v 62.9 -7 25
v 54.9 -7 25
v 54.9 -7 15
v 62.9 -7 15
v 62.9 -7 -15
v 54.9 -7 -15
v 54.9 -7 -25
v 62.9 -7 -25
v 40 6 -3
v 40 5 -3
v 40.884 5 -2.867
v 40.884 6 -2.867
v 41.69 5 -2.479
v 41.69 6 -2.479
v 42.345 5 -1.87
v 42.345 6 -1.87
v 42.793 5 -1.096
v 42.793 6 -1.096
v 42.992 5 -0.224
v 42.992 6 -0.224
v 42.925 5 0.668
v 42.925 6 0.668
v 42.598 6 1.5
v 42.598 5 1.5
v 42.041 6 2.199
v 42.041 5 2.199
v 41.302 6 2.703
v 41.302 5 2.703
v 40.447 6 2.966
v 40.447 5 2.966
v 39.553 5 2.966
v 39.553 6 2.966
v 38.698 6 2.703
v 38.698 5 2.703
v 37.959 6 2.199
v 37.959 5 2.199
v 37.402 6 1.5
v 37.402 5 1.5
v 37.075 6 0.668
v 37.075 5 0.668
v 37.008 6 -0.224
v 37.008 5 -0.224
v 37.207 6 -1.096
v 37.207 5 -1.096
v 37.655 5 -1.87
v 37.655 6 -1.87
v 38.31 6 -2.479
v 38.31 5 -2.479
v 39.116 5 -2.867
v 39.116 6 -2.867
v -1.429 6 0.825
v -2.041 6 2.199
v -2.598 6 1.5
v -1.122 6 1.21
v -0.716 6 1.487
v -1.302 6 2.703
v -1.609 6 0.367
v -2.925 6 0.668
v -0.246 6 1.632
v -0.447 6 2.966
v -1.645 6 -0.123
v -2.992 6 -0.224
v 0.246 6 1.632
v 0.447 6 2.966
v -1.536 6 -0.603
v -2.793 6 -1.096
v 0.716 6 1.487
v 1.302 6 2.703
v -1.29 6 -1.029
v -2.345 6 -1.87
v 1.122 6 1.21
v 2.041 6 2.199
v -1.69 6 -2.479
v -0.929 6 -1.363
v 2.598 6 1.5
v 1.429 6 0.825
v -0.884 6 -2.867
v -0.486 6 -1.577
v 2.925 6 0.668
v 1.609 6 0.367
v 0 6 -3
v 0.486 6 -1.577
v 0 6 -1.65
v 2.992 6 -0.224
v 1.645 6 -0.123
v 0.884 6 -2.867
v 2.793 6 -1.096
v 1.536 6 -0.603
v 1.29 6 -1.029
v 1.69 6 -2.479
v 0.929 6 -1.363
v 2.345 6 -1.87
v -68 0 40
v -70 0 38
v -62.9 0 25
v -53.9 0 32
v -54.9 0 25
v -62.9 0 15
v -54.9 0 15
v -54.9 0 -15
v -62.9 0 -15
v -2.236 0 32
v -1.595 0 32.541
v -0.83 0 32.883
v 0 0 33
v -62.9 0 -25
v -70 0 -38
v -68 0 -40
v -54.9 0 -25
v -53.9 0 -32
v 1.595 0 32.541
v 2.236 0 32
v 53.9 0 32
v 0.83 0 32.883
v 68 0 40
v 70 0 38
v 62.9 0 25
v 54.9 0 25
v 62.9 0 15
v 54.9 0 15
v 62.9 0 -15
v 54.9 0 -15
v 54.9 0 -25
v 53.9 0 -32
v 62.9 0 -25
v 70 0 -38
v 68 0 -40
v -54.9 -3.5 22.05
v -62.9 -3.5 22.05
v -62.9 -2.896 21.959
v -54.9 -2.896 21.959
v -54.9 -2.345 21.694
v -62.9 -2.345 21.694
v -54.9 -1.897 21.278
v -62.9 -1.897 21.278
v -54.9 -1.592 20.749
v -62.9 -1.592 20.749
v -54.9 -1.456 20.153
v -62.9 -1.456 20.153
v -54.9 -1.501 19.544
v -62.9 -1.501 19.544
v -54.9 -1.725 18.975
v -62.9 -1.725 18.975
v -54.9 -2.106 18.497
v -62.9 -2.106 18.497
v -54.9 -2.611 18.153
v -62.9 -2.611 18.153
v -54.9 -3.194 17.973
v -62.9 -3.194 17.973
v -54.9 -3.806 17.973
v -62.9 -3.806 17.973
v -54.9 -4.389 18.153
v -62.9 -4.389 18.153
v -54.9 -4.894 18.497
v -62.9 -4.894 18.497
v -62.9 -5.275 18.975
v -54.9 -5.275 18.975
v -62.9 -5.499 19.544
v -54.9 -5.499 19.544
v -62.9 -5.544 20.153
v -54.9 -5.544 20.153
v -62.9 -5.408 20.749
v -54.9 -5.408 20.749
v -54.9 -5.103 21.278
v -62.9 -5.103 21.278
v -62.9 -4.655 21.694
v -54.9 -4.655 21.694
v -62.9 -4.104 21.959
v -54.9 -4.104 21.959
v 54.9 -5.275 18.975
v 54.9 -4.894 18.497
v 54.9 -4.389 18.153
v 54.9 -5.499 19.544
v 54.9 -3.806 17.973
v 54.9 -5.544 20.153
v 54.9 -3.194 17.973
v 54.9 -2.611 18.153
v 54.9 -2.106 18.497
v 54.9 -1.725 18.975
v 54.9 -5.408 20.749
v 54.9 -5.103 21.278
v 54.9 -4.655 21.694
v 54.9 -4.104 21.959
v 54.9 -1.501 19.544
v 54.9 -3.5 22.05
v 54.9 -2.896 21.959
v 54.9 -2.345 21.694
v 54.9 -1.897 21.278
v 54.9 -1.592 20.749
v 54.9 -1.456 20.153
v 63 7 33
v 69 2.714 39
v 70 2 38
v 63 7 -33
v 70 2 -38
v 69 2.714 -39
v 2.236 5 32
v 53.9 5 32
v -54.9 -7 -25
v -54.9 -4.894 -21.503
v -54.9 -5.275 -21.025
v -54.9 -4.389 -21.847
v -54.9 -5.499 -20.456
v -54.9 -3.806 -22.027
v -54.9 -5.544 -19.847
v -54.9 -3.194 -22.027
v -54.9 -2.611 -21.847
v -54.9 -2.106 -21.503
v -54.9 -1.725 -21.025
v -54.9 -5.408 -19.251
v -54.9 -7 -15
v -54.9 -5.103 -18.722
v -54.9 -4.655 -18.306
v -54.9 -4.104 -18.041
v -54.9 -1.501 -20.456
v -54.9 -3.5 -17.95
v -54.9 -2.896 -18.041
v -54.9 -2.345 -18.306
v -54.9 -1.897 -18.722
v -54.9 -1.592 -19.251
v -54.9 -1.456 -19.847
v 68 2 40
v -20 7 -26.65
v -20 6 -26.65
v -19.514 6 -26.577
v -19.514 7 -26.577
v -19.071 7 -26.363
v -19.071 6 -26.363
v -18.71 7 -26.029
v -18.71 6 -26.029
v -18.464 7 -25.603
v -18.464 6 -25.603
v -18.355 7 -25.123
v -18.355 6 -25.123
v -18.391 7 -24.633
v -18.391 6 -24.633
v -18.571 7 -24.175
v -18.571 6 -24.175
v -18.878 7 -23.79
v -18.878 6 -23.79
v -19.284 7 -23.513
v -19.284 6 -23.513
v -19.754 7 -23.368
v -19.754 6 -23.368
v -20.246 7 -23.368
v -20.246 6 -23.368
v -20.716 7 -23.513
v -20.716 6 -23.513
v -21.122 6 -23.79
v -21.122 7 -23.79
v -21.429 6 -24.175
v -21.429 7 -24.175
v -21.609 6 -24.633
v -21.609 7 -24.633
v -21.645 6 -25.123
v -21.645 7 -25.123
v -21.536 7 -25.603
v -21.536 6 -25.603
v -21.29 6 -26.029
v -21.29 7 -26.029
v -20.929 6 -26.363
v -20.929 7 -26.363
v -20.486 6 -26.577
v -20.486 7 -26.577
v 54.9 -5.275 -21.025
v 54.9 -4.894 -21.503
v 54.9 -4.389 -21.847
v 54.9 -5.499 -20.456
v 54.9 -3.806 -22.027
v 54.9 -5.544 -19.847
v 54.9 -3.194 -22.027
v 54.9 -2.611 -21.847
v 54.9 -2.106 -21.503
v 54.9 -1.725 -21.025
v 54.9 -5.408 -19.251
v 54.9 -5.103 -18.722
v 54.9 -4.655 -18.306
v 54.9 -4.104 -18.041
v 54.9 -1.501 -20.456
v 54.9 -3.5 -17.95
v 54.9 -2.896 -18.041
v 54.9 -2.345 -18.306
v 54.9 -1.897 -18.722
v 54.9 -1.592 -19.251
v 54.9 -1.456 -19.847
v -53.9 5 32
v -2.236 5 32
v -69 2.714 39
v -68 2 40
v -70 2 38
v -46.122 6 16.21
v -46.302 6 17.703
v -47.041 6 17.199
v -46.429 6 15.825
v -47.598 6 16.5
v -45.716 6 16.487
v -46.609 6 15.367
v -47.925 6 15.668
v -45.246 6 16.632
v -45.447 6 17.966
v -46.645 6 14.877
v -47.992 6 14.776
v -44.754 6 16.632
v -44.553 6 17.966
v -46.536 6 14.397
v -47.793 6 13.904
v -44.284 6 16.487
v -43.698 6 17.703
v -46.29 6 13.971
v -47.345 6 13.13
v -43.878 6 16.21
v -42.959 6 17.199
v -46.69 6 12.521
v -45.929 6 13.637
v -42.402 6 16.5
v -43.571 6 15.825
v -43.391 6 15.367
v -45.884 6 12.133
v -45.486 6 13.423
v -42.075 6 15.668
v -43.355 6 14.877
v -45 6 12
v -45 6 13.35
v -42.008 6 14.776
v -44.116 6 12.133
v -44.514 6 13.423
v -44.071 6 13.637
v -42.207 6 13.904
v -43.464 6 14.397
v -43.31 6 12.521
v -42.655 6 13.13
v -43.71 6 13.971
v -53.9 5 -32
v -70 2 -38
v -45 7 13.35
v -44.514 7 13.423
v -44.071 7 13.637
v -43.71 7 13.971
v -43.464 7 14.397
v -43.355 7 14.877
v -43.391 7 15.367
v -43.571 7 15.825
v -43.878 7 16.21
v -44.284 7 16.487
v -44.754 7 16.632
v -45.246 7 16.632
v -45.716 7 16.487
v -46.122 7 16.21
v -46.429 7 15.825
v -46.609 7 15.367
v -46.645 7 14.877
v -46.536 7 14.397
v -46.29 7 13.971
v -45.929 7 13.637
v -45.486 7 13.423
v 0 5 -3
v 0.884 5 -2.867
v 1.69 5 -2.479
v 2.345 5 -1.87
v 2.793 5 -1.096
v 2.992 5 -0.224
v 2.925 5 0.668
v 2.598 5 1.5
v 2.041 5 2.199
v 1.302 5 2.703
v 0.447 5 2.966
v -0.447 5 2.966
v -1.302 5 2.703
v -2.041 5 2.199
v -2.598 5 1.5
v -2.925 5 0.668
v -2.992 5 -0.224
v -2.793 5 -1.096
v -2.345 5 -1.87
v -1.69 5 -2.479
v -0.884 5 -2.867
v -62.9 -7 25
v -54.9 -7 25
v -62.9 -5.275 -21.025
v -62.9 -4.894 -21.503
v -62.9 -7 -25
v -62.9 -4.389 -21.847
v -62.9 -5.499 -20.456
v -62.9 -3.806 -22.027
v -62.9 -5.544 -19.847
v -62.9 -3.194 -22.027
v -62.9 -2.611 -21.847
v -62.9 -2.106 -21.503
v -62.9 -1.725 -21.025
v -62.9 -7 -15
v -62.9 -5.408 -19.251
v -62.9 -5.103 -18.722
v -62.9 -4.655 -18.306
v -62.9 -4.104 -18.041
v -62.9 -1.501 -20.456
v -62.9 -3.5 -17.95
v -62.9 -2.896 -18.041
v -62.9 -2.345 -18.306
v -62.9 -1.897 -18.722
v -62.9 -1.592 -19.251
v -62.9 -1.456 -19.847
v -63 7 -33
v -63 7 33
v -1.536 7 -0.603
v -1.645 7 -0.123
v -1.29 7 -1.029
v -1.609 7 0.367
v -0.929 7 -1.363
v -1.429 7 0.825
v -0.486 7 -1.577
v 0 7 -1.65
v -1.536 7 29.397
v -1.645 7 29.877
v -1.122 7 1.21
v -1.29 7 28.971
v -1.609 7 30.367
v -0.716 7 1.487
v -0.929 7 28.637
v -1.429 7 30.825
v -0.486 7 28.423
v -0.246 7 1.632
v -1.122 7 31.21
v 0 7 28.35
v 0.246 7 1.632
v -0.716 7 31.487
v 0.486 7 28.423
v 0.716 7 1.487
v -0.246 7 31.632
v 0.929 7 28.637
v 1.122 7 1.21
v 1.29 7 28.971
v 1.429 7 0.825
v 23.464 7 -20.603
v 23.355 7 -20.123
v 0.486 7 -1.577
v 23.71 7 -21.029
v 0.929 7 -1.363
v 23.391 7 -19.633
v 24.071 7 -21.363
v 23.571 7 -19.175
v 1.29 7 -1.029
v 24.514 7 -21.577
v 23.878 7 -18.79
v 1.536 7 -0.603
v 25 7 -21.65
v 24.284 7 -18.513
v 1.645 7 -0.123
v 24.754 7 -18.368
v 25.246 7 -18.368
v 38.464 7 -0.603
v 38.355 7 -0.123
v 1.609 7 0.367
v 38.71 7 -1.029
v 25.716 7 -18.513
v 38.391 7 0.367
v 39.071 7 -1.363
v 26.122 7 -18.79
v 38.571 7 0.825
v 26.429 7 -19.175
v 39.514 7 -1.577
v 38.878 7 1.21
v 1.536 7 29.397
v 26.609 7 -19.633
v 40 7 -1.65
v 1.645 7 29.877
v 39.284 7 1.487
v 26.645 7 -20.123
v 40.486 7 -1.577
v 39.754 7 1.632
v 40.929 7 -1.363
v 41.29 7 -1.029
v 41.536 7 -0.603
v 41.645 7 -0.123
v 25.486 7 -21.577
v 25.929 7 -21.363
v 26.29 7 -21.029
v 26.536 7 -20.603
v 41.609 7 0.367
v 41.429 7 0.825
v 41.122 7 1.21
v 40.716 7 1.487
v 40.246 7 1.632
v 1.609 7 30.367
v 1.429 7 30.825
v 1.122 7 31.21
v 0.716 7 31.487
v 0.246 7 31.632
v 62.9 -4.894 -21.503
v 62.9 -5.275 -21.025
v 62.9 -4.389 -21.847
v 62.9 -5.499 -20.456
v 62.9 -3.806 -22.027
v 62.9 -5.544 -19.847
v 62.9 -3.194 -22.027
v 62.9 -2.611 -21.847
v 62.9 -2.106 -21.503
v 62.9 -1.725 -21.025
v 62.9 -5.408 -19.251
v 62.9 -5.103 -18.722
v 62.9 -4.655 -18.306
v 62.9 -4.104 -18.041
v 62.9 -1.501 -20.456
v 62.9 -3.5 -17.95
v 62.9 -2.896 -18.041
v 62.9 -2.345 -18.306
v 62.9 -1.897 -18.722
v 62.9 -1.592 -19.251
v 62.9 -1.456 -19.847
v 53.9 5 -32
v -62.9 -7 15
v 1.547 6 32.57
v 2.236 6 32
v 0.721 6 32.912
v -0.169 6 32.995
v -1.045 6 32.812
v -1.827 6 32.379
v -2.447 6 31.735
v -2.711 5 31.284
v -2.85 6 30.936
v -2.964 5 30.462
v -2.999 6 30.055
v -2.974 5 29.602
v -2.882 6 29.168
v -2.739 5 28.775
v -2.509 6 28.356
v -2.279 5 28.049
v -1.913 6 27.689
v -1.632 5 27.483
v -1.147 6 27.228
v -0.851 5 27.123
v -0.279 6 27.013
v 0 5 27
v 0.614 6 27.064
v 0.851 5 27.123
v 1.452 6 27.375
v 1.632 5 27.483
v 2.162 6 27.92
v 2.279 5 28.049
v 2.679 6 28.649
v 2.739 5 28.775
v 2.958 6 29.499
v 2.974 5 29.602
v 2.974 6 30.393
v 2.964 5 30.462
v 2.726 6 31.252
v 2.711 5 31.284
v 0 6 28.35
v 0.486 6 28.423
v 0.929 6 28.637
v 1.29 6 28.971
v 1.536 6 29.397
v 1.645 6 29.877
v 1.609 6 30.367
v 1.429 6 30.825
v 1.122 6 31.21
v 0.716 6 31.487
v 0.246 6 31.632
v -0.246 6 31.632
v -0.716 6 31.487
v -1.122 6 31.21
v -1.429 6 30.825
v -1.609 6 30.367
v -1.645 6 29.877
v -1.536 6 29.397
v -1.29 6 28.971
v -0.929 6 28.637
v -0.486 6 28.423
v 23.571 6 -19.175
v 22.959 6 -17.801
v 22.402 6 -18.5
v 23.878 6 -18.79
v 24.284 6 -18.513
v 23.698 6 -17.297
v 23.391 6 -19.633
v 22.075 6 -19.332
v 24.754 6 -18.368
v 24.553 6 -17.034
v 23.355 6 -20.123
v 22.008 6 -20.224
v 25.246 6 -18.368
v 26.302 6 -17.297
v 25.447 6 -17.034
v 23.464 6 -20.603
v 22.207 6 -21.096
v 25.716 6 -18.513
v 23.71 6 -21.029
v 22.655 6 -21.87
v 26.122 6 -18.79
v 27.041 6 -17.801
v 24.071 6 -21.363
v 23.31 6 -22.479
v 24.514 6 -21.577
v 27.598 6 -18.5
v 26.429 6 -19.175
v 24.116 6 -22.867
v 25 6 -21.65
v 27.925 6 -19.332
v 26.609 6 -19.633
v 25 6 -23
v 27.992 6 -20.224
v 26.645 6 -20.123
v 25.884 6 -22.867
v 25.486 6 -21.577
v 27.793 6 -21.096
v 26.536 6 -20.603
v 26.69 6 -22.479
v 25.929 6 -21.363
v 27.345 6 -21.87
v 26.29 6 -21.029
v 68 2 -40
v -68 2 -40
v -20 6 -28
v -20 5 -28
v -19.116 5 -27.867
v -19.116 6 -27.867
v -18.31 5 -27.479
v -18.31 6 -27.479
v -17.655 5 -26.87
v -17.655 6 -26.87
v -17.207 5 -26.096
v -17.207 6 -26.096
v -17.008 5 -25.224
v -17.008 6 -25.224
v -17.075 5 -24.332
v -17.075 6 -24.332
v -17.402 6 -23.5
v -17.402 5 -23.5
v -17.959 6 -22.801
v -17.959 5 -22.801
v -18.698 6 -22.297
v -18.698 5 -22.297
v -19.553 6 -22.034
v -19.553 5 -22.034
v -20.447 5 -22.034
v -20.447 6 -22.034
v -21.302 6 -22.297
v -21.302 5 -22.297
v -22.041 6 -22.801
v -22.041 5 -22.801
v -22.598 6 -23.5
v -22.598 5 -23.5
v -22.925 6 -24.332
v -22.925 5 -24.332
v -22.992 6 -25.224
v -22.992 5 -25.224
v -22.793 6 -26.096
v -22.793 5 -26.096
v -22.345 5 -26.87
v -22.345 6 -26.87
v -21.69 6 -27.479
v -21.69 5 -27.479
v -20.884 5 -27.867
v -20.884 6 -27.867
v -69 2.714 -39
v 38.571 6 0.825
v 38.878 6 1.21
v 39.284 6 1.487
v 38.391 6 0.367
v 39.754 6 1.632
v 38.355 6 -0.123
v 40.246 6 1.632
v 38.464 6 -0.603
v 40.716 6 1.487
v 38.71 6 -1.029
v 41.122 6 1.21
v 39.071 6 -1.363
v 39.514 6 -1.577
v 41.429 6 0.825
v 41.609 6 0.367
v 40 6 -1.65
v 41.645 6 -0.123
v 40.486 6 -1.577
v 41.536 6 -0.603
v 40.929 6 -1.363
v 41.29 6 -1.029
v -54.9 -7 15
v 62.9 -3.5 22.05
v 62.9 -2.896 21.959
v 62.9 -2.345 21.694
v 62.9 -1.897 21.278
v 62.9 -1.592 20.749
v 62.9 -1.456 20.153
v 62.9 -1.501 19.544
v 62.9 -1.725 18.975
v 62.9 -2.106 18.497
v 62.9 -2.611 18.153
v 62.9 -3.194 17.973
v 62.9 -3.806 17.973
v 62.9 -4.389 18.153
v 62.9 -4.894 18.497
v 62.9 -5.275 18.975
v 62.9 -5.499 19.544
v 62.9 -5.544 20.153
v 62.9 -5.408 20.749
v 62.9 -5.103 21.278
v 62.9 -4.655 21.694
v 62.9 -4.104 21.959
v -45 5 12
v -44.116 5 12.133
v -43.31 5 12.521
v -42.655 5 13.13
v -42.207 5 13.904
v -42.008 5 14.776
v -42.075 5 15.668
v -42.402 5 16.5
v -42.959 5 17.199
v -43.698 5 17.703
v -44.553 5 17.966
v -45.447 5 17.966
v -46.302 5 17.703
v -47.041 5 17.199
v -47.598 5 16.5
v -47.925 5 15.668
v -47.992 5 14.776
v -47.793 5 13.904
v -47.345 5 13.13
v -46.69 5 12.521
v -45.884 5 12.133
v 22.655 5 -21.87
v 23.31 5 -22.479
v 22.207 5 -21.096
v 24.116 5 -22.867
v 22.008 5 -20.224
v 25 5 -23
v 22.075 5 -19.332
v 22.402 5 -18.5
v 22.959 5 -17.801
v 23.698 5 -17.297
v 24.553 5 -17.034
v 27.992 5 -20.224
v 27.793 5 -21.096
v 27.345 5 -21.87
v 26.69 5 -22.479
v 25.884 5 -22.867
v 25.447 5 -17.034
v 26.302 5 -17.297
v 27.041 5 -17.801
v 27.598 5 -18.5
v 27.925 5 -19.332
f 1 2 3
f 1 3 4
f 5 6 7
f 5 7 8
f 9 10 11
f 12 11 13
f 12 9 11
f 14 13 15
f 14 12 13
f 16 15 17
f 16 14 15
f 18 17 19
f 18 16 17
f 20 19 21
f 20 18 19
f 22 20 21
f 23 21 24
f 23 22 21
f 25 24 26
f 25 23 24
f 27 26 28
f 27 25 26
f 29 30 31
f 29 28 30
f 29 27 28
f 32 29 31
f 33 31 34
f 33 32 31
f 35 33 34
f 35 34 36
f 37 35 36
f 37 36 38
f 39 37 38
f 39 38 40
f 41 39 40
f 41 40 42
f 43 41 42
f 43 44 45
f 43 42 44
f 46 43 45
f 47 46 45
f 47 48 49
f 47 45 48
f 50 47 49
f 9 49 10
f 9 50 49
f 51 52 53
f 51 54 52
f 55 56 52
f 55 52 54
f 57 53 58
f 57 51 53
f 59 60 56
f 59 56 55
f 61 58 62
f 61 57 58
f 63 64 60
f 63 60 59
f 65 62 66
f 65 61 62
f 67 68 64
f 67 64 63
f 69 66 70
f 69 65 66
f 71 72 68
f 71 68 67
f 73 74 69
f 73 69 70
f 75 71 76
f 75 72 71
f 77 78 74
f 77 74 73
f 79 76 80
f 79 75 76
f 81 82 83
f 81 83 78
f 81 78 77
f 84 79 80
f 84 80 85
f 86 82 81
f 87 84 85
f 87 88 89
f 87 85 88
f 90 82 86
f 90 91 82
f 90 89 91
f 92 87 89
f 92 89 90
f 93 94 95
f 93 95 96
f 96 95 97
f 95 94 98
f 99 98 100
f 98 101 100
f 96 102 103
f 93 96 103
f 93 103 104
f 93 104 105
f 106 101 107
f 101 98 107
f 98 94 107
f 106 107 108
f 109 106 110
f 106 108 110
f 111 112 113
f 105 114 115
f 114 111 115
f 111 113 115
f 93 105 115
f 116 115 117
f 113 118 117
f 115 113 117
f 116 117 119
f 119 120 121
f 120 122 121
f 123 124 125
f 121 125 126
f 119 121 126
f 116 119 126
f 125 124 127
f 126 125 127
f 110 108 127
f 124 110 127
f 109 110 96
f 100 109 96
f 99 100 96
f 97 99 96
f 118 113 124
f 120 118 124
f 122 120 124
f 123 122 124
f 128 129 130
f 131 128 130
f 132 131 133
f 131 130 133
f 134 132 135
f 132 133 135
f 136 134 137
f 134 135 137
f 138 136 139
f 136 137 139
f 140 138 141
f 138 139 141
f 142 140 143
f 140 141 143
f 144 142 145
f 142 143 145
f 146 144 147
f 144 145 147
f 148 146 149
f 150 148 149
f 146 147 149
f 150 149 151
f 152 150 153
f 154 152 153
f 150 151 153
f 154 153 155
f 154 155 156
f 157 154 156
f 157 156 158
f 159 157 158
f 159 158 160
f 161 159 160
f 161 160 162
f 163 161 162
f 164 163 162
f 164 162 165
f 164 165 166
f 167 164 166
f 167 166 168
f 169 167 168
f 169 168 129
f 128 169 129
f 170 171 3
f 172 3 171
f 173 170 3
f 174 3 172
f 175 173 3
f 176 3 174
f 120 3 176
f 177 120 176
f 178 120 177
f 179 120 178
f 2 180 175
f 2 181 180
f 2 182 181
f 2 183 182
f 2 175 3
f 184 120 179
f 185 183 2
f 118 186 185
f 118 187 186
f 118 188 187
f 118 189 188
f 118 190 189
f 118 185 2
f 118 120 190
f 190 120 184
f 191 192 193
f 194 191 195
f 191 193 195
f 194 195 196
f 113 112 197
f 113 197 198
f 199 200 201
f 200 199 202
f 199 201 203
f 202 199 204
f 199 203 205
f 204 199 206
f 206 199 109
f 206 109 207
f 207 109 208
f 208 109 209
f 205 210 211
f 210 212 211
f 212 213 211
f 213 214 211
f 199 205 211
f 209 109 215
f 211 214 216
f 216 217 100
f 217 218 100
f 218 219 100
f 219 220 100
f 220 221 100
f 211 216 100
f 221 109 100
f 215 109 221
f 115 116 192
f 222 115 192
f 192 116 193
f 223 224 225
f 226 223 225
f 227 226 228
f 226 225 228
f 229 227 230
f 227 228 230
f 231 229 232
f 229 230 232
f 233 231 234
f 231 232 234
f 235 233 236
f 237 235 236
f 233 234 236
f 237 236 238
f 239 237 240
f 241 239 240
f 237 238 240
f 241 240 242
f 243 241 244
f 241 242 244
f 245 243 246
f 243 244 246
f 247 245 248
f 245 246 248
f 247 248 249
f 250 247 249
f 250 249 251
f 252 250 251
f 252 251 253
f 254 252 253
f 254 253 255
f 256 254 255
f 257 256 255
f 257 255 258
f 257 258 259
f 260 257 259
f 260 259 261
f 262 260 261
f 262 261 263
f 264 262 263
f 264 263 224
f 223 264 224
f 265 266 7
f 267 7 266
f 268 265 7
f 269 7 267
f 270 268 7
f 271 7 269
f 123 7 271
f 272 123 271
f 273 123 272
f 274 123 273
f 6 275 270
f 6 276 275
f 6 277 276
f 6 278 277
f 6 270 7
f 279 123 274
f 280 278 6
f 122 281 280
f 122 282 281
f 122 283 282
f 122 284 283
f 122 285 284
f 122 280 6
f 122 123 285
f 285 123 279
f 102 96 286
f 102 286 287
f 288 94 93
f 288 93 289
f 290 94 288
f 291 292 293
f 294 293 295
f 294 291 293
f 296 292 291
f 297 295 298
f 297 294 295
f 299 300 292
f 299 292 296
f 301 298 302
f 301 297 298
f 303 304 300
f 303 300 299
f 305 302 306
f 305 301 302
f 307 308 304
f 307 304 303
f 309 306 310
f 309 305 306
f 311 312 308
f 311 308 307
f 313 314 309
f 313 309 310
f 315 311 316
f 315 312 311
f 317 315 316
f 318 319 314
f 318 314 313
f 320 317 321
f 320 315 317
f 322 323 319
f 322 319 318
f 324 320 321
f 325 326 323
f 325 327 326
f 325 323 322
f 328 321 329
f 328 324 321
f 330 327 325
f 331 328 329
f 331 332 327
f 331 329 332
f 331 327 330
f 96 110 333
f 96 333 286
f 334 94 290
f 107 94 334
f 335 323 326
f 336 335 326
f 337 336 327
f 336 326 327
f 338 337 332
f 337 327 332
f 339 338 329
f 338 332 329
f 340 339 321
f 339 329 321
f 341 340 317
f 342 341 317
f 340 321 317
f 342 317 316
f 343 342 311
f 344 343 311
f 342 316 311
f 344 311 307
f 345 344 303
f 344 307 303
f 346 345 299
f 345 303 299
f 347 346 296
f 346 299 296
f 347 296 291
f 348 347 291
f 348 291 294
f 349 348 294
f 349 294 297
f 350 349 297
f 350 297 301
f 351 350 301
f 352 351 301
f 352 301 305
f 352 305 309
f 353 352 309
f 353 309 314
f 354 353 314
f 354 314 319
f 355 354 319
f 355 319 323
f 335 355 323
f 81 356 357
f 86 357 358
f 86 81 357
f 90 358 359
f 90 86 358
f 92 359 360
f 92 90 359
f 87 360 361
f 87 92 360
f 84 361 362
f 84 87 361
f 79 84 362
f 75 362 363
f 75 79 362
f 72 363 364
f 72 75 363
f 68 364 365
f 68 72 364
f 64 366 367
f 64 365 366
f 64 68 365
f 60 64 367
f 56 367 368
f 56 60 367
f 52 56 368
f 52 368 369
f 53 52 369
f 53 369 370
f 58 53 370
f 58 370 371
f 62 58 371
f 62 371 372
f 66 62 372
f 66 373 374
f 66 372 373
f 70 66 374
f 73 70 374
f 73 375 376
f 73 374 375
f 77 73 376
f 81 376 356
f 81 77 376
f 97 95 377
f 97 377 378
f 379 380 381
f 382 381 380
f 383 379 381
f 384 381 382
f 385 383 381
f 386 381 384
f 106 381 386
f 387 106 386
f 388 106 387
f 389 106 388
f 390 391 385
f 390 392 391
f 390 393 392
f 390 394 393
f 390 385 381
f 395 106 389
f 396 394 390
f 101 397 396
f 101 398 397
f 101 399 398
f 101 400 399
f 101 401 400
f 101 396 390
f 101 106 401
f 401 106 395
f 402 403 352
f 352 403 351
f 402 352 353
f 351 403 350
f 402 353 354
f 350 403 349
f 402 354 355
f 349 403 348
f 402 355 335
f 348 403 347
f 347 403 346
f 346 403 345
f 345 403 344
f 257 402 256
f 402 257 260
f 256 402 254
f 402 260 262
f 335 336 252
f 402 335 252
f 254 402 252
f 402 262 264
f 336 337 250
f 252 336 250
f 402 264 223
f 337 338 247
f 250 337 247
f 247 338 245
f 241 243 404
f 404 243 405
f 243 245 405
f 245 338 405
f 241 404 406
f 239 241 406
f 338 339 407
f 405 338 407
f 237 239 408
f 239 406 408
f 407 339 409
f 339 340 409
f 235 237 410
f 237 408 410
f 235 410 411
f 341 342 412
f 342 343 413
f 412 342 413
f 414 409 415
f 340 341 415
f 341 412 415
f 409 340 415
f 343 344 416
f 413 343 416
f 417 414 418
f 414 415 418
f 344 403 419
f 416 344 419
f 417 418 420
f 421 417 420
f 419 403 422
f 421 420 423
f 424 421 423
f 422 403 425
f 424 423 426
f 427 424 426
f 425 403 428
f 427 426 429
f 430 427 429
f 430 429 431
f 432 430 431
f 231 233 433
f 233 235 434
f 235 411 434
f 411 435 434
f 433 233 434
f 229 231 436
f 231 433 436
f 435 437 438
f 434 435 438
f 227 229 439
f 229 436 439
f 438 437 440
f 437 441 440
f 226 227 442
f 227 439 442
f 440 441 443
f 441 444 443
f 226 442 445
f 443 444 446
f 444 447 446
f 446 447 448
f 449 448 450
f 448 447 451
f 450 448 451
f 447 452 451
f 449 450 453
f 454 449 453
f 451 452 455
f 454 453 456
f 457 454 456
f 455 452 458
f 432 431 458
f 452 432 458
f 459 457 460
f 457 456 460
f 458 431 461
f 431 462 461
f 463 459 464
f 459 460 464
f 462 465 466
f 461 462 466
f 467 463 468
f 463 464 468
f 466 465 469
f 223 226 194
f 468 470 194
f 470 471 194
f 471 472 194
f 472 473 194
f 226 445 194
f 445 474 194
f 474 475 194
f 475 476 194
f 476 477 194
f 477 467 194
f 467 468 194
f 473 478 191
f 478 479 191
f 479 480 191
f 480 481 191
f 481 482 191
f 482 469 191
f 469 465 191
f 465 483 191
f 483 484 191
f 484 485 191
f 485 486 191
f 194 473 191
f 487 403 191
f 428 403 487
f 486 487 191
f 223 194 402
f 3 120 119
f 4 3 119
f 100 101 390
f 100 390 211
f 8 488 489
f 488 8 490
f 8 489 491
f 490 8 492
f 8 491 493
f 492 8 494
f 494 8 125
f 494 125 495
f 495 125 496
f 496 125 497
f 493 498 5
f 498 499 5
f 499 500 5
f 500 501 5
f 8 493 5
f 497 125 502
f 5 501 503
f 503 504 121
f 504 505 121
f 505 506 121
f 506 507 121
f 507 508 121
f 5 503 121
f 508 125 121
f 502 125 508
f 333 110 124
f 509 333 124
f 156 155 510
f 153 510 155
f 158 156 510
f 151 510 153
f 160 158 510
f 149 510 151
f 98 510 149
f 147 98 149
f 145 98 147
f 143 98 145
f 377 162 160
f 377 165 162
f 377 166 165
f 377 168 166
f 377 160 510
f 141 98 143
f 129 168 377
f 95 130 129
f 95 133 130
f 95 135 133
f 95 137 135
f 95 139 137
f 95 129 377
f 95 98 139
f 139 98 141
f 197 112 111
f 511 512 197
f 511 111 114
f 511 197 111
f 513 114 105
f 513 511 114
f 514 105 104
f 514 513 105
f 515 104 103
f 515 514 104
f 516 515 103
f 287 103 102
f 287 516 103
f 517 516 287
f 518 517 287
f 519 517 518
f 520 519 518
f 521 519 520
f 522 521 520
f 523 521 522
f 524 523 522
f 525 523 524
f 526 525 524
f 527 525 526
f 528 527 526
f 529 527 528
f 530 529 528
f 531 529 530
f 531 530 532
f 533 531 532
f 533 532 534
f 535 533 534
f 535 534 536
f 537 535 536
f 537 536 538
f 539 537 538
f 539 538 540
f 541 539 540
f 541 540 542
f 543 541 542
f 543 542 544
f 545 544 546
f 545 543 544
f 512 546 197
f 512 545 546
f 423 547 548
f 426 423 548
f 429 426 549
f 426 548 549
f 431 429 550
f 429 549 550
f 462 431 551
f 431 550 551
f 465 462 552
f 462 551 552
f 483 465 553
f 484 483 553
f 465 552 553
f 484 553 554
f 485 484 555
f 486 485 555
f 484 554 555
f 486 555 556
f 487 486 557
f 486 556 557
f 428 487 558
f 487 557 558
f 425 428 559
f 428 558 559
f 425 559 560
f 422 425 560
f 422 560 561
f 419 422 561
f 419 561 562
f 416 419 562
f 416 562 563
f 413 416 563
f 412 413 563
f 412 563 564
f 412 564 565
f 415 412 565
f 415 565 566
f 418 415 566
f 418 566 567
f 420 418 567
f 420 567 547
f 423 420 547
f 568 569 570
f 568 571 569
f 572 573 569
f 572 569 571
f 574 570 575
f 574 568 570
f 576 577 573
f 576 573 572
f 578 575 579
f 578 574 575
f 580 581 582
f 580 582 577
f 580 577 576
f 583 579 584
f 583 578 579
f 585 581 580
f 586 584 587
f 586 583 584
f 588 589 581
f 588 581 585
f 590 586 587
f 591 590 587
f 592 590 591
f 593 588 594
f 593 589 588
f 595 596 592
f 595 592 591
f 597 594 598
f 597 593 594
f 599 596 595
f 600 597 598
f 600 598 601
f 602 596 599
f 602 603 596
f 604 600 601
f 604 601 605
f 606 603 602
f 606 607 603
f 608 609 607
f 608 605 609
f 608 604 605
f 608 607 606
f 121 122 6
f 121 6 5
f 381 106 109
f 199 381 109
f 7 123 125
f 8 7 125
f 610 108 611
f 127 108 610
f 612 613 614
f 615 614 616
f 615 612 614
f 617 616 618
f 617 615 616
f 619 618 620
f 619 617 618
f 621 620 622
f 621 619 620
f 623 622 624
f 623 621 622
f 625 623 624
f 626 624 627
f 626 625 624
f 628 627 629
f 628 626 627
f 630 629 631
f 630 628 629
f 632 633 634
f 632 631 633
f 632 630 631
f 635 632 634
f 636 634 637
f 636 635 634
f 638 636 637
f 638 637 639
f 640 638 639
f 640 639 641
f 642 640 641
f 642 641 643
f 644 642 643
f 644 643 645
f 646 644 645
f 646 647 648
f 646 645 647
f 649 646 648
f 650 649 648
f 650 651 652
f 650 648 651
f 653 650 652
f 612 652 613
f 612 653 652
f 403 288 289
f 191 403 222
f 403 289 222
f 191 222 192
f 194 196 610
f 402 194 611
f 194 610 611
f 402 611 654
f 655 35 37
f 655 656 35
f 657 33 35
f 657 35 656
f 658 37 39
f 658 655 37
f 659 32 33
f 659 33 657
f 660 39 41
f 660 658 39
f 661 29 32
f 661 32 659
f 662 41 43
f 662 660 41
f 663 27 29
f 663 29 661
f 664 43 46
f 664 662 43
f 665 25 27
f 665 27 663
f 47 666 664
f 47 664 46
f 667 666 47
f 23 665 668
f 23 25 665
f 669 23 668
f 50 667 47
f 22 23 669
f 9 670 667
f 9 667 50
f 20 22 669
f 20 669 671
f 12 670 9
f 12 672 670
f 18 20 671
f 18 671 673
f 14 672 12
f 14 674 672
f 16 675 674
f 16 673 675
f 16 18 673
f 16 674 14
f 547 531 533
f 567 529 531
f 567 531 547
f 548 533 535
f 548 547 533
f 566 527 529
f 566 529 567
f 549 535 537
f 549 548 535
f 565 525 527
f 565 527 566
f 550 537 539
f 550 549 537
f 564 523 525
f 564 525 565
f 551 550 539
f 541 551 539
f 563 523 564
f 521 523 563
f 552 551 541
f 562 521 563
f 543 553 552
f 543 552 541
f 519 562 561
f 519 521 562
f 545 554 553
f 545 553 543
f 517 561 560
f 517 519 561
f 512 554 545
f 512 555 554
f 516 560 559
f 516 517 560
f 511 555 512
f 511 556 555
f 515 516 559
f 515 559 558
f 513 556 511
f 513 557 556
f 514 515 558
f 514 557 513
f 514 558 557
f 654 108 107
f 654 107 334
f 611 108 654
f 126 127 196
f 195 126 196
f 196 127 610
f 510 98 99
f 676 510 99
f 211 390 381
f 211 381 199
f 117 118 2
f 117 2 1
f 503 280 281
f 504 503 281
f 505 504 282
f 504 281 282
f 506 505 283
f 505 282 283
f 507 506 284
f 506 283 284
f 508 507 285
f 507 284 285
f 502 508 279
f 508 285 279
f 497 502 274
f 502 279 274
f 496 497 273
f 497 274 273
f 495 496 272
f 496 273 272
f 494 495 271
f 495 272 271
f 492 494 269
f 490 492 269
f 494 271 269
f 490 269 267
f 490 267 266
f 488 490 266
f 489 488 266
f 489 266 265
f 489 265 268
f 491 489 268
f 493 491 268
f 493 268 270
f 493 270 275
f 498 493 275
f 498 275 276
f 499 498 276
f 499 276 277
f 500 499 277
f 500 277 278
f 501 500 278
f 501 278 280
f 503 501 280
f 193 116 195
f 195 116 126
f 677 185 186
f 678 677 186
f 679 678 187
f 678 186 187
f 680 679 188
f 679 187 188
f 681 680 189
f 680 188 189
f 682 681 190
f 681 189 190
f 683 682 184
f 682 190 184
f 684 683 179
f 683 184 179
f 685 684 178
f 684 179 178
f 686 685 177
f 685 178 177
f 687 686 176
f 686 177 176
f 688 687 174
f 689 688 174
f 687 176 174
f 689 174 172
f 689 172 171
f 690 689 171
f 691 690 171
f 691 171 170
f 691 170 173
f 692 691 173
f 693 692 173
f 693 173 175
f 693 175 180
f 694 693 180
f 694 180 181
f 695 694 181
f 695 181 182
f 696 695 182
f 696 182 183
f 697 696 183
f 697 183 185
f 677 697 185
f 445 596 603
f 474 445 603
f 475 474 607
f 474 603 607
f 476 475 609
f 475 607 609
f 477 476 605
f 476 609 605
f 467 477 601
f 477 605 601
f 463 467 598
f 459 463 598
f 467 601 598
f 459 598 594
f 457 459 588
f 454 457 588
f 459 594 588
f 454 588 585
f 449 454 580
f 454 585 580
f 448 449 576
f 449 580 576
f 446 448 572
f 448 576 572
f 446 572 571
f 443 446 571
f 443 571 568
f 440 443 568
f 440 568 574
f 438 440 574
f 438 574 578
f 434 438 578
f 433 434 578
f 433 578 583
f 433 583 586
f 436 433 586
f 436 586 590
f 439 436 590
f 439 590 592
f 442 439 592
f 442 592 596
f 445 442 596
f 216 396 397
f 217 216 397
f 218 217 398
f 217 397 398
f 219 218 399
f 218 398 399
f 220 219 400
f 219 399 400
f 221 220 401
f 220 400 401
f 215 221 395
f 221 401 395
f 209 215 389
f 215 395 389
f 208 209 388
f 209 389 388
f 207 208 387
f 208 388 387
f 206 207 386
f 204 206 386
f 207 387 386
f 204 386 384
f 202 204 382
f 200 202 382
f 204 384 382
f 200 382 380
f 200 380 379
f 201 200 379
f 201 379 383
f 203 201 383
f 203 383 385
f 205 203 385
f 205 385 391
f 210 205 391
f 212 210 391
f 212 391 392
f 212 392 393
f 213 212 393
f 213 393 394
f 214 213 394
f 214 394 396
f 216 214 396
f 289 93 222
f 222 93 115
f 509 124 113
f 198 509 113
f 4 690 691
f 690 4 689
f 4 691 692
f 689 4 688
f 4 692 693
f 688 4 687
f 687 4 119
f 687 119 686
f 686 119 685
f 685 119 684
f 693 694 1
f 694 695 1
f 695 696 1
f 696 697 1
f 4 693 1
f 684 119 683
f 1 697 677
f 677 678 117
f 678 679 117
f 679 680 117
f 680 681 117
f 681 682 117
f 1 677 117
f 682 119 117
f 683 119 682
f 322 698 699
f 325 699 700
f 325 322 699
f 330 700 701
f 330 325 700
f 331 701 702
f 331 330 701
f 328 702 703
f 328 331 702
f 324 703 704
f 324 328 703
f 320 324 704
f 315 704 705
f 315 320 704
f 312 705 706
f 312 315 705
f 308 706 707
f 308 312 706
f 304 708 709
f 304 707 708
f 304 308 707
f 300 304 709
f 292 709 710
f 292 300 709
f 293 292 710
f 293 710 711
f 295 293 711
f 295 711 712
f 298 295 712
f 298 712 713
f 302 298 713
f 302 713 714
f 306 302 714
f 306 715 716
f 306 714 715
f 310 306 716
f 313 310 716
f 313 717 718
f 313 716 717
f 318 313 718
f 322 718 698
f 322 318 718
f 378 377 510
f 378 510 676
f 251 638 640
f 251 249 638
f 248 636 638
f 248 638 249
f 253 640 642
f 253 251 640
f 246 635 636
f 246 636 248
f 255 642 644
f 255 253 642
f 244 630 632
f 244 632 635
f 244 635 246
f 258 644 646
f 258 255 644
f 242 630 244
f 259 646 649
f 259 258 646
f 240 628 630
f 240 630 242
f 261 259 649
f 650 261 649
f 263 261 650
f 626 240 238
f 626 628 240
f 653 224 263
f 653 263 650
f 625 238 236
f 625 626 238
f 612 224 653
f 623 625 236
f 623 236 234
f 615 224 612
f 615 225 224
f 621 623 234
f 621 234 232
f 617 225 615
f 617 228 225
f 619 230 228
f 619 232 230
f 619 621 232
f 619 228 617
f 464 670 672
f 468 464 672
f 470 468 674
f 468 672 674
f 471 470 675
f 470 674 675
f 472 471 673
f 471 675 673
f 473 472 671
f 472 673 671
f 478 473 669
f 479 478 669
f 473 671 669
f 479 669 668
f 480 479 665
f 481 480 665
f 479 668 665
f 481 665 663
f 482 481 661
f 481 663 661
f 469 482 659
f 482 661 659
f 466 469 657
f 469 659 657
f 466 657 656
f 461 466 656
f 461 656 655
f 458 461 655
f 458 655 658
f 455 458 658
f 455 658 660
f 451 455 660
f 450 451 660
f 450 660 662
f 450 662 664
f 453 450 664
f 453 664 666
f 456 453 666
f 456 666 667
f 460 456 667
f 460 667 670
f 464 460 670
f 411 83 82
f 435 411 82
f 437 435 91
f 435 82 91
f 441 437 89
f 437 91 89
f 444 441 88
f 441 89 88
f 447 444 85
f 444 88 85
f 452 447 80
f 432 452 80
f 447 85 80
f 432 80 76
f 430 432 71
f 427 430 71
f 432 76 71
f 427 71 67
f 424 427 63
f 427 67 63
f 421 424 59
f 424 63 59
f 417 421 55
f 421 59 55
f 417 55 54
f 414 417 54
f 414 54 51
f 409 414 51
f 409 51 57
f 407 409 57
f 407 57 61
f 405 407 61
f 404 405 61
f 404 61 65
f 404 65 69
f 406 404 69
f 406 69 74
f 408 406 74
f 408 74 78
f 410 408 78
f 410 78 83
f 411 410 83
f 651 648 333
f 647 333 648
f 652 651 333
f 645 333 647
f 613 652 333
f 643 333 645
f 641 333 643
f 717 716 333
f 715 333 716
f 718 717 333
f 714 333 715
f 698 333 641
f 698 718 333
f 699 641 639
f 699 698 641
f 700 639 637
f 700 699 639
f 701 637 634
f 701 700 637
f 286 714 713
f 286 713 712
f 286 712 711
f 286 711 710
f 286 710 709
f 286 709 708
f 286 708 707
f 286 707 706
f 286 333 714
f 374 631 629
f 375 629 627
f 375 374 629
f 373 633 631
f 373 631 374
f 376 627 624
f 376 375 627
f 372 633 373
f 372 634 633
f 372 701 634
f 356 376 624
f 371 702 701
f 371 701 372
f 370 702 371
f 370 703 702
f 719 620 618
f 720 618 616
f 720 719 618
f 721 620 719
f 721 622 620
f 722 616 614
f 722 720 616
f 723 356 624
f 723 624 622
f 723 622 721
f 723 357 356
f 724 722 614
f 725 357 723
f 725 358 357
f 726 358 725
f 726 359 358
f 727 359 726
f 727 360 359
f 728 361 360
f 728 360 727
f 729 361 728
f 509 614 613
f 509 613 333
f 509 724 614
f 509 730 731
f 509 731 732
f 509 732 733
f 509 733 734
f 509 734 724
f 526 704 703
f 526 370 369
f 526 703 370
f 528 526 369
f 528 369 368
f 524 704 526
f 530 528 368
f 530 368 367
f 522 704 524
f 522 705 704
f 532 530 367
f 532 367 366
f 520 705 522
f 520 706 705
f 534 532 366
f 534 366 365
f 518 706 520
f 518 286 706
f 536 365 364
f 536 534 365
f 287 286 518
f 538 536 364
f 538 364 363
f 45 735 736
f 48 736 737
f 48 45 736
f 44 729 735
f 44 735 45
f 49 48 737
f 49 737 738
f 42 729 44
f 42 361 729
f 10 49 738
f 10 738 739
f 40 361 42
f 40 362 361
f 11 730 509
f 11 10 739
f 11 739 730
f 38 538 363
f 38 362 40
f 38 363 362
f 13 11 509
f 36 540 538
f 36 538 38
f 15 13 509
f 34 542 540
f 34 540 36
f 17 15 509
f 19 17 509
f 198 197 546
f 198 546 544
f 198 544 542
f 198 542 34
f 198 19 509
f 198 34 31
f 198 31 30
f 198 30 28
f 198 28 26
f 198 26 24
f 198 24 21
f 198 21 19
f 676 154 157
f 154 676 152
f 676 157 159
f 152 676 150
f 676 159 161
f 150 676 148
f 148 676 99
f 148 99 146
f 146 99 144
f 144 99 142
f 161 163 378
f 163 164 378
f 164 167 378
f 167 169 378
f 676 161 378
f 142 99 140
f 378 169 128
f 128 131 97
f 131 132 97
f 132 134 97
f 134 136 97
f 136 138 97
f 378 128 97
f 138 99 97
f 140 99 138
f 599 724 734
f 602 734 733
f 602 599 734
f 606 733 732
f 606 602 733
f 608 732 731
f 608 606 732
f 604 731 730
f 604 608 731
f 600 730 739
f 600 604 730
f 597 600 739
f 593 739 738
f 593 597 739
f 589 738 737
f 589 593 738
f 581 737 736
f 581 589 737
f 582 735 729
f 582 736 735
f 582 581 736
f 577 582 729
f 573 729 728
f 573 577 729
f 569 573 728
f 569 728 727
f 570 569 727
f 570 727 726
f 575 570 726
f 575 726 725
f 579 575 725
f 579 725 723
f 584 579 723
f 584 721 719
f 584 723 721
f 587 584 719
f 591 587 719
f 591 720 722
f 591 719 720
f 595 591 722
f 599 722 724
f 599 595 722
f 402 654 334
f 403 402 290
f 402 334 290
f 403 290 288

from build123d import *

# Parameters (mm, degrees)
SKETCH1_W               = 140
SKETCH1_H               = 80
BOSS_EXTRUDE1_DEPTH     = 2
CHAMFER2_SIZE           = 2
SKETCH4_W               = 8
SKETCH4_H               = 10
BOSS_EXTRUDE2_DEPTH     = 7
SKETCH5_R               = 2.05
CUT_EXTRUDE1_DEPTH      = 139.965499445
SKETCH6_W               = 107.8
SKETCH6_H               = 64
CUT_EXTRUDE2_DEPTH      = 5
SKETCH7_R               = 1.65
CUT_EXTRUDE3_DEPTH      = 82.510735624
CUT_EXTRUDE4_DEPTH      = 82.510735624
CUT_EXTRUDE4_DEPTH_BACK = 1
SKETCH8_R               = 3


with BuildPart() as part:
    # Sketch1 → Boss-Extrude1 (new body)
    with BuildSketch(Plane(origin=(0, 0, 0), x_dir=(1, 0, 0), z_dir=(0, 1, 0))):
        Rectangle(SKETCH1_W, SKETCH1_H)
    extrude(amount=BOSS_EXTRUDE1_DEPTH)

    # Sketch3 → Loft1 section 0
    with BuildSketch(Plane(origin=(0, 7, 0), x_dir=(1, 0, 0), z_dir=(0, 1, 0))):
        with BuildLine():
            Line((-63, -33), (63, -33))
            Line((63, -33), (63, 33))
            Line((63, 33), (-63, 33))
            Line((-63, 33), (-63, -33))
        make_face()
    # Sketch2 → Loft1 section 1
    with BuildSketch(Plane(origin=(0, 2, 0), x_dir=(1, 0, 0), z_dir=(0, 1, 0))):
        with BuildLine():
            Line((70, -40), (70, 40))
            Line((70, 40), (-70, 40))
            Line((-70, 40), (-70, -40))
            Line((-70, -40), (70, -40))
        make_face()
    loft()

    # Chamfer2
    chamfer2_edges = [part.edges().sort_by_distance(p)[0] for p in [
        (70, 1, 40),
        (-70, 1, 40),
        (-70, 1, -40),
        (70, 1, -40),
    ]]
    chamfer(chamfer2_edges, length=CHAMFER2_SIZE)

    # Sketch4 → Boss-Extrude2 (add)
    with BuildSketch(Plane.XZ):
        with Locations((-58.9, 20)):
            Rectangle(SKETCH4_W, SKETCH4_H)
        with Locations((-58.9, -20)):
            Rectangle(SKETCH4_W, SKETCH4_H)
        with Locations((58.9, -20)):
            Rectangle(SKETCH4_W, SKETCH4_H)
        with Locations((58.9, 20)):
            Rectangle(SKETCH4_W, SKETCH4_H)
    extrude(amount=BOSS_EXTRUDE2_DEPTH)

    # Sketch5 → Cut-Extrude1 (cut, through all)
    with BuildSketch(Plane.ZY.offset(62.9)):
        with Locations((-20, -3.5)):
            Circle(SKETCH5_R)
        with Locations((20, -3.5)):
            Circle(SKETCH5_R)
    extrude(amount=-CUT_EXTRUDE1_DEPTH, mode=Mode.SUBTRACT)

    # Sketch6 → Cut-Extrude2 (cut)
    with BuildSketch(Plane.XZ):
        Rectangle(SKETCH6_W, SKETCH6_H)
    extrude(amount=-CUT_EXTRUDE2_DEPTH, mode=Mode.SUBTRACT)

    # Sketch7 → Cut-Extrude3 (cut, through all)
    with BuildSketch(Plane.XZ.offset(-5)):
        with Locations(Location((0, 30, 0), (0, 0, 270))):
            Circle(SKETCH7_R)
        with Locations(Location((40, 0, 0), (0, 0, 270))):
            Circle(SKETCH7_R)
        with Locations(Location((25, -20, 0), (0, 0, 270))):
            Circle(SKETCH7_R)
        with Locations(Location((-20, -25, 0), (0, 0, 270))):
            Circle(SKETCH7_R)
        with Locations(Location((-45, 15, 0), (0, 0, 270))):
            Circle(SKETCH7_R)
        with Locations(Location((0, 0, 0), (0, 0, 270))):
            Circle(SKETCH7_R)
    extrude(amount=-CUT_EXTRUDE3_DEPTH, mode=Mode.SUBTRACT)

    # Sketch8 → Cut-Extrude4 (cut, two sides: drawn at the far end of the back side and taken through both)
    with BuildSketch(Plane.XZ.offset(-5).offset(-CUT_EXTRUDE4_DEPTH_BACK)):
        with Locations(Location((0, 30, 0), (0, 0, 41.810314896))):
            Circle(SKETCH8_R)
        with Locations(Location((40, 0, 0), (0, 0, 270))):
            Circle(SKETCH8_R)
        with Locations(Location((25, -20, 0), (0, 0, 270))):
            Circle(SKETCH8_R)
        with Locations(Location((0, 0, 0), (0, 0, 270))):
            Circle(SKETCH8_R)
        with Locations(Location((-45, 15, 0), (0, 0, 270))):
            Circle(SKETCH8_R)
        with Locations(Location((-20, -25, 0), (0, 0, 270))):
            Circle(SKETCH8_R)
    extrude(amount=CUT_EXTRUDE4_DEPTH + CUT_EXTRUDE4_DEPTH_BACK, mode=Mode.SUBTRACT)


solid = part.part
